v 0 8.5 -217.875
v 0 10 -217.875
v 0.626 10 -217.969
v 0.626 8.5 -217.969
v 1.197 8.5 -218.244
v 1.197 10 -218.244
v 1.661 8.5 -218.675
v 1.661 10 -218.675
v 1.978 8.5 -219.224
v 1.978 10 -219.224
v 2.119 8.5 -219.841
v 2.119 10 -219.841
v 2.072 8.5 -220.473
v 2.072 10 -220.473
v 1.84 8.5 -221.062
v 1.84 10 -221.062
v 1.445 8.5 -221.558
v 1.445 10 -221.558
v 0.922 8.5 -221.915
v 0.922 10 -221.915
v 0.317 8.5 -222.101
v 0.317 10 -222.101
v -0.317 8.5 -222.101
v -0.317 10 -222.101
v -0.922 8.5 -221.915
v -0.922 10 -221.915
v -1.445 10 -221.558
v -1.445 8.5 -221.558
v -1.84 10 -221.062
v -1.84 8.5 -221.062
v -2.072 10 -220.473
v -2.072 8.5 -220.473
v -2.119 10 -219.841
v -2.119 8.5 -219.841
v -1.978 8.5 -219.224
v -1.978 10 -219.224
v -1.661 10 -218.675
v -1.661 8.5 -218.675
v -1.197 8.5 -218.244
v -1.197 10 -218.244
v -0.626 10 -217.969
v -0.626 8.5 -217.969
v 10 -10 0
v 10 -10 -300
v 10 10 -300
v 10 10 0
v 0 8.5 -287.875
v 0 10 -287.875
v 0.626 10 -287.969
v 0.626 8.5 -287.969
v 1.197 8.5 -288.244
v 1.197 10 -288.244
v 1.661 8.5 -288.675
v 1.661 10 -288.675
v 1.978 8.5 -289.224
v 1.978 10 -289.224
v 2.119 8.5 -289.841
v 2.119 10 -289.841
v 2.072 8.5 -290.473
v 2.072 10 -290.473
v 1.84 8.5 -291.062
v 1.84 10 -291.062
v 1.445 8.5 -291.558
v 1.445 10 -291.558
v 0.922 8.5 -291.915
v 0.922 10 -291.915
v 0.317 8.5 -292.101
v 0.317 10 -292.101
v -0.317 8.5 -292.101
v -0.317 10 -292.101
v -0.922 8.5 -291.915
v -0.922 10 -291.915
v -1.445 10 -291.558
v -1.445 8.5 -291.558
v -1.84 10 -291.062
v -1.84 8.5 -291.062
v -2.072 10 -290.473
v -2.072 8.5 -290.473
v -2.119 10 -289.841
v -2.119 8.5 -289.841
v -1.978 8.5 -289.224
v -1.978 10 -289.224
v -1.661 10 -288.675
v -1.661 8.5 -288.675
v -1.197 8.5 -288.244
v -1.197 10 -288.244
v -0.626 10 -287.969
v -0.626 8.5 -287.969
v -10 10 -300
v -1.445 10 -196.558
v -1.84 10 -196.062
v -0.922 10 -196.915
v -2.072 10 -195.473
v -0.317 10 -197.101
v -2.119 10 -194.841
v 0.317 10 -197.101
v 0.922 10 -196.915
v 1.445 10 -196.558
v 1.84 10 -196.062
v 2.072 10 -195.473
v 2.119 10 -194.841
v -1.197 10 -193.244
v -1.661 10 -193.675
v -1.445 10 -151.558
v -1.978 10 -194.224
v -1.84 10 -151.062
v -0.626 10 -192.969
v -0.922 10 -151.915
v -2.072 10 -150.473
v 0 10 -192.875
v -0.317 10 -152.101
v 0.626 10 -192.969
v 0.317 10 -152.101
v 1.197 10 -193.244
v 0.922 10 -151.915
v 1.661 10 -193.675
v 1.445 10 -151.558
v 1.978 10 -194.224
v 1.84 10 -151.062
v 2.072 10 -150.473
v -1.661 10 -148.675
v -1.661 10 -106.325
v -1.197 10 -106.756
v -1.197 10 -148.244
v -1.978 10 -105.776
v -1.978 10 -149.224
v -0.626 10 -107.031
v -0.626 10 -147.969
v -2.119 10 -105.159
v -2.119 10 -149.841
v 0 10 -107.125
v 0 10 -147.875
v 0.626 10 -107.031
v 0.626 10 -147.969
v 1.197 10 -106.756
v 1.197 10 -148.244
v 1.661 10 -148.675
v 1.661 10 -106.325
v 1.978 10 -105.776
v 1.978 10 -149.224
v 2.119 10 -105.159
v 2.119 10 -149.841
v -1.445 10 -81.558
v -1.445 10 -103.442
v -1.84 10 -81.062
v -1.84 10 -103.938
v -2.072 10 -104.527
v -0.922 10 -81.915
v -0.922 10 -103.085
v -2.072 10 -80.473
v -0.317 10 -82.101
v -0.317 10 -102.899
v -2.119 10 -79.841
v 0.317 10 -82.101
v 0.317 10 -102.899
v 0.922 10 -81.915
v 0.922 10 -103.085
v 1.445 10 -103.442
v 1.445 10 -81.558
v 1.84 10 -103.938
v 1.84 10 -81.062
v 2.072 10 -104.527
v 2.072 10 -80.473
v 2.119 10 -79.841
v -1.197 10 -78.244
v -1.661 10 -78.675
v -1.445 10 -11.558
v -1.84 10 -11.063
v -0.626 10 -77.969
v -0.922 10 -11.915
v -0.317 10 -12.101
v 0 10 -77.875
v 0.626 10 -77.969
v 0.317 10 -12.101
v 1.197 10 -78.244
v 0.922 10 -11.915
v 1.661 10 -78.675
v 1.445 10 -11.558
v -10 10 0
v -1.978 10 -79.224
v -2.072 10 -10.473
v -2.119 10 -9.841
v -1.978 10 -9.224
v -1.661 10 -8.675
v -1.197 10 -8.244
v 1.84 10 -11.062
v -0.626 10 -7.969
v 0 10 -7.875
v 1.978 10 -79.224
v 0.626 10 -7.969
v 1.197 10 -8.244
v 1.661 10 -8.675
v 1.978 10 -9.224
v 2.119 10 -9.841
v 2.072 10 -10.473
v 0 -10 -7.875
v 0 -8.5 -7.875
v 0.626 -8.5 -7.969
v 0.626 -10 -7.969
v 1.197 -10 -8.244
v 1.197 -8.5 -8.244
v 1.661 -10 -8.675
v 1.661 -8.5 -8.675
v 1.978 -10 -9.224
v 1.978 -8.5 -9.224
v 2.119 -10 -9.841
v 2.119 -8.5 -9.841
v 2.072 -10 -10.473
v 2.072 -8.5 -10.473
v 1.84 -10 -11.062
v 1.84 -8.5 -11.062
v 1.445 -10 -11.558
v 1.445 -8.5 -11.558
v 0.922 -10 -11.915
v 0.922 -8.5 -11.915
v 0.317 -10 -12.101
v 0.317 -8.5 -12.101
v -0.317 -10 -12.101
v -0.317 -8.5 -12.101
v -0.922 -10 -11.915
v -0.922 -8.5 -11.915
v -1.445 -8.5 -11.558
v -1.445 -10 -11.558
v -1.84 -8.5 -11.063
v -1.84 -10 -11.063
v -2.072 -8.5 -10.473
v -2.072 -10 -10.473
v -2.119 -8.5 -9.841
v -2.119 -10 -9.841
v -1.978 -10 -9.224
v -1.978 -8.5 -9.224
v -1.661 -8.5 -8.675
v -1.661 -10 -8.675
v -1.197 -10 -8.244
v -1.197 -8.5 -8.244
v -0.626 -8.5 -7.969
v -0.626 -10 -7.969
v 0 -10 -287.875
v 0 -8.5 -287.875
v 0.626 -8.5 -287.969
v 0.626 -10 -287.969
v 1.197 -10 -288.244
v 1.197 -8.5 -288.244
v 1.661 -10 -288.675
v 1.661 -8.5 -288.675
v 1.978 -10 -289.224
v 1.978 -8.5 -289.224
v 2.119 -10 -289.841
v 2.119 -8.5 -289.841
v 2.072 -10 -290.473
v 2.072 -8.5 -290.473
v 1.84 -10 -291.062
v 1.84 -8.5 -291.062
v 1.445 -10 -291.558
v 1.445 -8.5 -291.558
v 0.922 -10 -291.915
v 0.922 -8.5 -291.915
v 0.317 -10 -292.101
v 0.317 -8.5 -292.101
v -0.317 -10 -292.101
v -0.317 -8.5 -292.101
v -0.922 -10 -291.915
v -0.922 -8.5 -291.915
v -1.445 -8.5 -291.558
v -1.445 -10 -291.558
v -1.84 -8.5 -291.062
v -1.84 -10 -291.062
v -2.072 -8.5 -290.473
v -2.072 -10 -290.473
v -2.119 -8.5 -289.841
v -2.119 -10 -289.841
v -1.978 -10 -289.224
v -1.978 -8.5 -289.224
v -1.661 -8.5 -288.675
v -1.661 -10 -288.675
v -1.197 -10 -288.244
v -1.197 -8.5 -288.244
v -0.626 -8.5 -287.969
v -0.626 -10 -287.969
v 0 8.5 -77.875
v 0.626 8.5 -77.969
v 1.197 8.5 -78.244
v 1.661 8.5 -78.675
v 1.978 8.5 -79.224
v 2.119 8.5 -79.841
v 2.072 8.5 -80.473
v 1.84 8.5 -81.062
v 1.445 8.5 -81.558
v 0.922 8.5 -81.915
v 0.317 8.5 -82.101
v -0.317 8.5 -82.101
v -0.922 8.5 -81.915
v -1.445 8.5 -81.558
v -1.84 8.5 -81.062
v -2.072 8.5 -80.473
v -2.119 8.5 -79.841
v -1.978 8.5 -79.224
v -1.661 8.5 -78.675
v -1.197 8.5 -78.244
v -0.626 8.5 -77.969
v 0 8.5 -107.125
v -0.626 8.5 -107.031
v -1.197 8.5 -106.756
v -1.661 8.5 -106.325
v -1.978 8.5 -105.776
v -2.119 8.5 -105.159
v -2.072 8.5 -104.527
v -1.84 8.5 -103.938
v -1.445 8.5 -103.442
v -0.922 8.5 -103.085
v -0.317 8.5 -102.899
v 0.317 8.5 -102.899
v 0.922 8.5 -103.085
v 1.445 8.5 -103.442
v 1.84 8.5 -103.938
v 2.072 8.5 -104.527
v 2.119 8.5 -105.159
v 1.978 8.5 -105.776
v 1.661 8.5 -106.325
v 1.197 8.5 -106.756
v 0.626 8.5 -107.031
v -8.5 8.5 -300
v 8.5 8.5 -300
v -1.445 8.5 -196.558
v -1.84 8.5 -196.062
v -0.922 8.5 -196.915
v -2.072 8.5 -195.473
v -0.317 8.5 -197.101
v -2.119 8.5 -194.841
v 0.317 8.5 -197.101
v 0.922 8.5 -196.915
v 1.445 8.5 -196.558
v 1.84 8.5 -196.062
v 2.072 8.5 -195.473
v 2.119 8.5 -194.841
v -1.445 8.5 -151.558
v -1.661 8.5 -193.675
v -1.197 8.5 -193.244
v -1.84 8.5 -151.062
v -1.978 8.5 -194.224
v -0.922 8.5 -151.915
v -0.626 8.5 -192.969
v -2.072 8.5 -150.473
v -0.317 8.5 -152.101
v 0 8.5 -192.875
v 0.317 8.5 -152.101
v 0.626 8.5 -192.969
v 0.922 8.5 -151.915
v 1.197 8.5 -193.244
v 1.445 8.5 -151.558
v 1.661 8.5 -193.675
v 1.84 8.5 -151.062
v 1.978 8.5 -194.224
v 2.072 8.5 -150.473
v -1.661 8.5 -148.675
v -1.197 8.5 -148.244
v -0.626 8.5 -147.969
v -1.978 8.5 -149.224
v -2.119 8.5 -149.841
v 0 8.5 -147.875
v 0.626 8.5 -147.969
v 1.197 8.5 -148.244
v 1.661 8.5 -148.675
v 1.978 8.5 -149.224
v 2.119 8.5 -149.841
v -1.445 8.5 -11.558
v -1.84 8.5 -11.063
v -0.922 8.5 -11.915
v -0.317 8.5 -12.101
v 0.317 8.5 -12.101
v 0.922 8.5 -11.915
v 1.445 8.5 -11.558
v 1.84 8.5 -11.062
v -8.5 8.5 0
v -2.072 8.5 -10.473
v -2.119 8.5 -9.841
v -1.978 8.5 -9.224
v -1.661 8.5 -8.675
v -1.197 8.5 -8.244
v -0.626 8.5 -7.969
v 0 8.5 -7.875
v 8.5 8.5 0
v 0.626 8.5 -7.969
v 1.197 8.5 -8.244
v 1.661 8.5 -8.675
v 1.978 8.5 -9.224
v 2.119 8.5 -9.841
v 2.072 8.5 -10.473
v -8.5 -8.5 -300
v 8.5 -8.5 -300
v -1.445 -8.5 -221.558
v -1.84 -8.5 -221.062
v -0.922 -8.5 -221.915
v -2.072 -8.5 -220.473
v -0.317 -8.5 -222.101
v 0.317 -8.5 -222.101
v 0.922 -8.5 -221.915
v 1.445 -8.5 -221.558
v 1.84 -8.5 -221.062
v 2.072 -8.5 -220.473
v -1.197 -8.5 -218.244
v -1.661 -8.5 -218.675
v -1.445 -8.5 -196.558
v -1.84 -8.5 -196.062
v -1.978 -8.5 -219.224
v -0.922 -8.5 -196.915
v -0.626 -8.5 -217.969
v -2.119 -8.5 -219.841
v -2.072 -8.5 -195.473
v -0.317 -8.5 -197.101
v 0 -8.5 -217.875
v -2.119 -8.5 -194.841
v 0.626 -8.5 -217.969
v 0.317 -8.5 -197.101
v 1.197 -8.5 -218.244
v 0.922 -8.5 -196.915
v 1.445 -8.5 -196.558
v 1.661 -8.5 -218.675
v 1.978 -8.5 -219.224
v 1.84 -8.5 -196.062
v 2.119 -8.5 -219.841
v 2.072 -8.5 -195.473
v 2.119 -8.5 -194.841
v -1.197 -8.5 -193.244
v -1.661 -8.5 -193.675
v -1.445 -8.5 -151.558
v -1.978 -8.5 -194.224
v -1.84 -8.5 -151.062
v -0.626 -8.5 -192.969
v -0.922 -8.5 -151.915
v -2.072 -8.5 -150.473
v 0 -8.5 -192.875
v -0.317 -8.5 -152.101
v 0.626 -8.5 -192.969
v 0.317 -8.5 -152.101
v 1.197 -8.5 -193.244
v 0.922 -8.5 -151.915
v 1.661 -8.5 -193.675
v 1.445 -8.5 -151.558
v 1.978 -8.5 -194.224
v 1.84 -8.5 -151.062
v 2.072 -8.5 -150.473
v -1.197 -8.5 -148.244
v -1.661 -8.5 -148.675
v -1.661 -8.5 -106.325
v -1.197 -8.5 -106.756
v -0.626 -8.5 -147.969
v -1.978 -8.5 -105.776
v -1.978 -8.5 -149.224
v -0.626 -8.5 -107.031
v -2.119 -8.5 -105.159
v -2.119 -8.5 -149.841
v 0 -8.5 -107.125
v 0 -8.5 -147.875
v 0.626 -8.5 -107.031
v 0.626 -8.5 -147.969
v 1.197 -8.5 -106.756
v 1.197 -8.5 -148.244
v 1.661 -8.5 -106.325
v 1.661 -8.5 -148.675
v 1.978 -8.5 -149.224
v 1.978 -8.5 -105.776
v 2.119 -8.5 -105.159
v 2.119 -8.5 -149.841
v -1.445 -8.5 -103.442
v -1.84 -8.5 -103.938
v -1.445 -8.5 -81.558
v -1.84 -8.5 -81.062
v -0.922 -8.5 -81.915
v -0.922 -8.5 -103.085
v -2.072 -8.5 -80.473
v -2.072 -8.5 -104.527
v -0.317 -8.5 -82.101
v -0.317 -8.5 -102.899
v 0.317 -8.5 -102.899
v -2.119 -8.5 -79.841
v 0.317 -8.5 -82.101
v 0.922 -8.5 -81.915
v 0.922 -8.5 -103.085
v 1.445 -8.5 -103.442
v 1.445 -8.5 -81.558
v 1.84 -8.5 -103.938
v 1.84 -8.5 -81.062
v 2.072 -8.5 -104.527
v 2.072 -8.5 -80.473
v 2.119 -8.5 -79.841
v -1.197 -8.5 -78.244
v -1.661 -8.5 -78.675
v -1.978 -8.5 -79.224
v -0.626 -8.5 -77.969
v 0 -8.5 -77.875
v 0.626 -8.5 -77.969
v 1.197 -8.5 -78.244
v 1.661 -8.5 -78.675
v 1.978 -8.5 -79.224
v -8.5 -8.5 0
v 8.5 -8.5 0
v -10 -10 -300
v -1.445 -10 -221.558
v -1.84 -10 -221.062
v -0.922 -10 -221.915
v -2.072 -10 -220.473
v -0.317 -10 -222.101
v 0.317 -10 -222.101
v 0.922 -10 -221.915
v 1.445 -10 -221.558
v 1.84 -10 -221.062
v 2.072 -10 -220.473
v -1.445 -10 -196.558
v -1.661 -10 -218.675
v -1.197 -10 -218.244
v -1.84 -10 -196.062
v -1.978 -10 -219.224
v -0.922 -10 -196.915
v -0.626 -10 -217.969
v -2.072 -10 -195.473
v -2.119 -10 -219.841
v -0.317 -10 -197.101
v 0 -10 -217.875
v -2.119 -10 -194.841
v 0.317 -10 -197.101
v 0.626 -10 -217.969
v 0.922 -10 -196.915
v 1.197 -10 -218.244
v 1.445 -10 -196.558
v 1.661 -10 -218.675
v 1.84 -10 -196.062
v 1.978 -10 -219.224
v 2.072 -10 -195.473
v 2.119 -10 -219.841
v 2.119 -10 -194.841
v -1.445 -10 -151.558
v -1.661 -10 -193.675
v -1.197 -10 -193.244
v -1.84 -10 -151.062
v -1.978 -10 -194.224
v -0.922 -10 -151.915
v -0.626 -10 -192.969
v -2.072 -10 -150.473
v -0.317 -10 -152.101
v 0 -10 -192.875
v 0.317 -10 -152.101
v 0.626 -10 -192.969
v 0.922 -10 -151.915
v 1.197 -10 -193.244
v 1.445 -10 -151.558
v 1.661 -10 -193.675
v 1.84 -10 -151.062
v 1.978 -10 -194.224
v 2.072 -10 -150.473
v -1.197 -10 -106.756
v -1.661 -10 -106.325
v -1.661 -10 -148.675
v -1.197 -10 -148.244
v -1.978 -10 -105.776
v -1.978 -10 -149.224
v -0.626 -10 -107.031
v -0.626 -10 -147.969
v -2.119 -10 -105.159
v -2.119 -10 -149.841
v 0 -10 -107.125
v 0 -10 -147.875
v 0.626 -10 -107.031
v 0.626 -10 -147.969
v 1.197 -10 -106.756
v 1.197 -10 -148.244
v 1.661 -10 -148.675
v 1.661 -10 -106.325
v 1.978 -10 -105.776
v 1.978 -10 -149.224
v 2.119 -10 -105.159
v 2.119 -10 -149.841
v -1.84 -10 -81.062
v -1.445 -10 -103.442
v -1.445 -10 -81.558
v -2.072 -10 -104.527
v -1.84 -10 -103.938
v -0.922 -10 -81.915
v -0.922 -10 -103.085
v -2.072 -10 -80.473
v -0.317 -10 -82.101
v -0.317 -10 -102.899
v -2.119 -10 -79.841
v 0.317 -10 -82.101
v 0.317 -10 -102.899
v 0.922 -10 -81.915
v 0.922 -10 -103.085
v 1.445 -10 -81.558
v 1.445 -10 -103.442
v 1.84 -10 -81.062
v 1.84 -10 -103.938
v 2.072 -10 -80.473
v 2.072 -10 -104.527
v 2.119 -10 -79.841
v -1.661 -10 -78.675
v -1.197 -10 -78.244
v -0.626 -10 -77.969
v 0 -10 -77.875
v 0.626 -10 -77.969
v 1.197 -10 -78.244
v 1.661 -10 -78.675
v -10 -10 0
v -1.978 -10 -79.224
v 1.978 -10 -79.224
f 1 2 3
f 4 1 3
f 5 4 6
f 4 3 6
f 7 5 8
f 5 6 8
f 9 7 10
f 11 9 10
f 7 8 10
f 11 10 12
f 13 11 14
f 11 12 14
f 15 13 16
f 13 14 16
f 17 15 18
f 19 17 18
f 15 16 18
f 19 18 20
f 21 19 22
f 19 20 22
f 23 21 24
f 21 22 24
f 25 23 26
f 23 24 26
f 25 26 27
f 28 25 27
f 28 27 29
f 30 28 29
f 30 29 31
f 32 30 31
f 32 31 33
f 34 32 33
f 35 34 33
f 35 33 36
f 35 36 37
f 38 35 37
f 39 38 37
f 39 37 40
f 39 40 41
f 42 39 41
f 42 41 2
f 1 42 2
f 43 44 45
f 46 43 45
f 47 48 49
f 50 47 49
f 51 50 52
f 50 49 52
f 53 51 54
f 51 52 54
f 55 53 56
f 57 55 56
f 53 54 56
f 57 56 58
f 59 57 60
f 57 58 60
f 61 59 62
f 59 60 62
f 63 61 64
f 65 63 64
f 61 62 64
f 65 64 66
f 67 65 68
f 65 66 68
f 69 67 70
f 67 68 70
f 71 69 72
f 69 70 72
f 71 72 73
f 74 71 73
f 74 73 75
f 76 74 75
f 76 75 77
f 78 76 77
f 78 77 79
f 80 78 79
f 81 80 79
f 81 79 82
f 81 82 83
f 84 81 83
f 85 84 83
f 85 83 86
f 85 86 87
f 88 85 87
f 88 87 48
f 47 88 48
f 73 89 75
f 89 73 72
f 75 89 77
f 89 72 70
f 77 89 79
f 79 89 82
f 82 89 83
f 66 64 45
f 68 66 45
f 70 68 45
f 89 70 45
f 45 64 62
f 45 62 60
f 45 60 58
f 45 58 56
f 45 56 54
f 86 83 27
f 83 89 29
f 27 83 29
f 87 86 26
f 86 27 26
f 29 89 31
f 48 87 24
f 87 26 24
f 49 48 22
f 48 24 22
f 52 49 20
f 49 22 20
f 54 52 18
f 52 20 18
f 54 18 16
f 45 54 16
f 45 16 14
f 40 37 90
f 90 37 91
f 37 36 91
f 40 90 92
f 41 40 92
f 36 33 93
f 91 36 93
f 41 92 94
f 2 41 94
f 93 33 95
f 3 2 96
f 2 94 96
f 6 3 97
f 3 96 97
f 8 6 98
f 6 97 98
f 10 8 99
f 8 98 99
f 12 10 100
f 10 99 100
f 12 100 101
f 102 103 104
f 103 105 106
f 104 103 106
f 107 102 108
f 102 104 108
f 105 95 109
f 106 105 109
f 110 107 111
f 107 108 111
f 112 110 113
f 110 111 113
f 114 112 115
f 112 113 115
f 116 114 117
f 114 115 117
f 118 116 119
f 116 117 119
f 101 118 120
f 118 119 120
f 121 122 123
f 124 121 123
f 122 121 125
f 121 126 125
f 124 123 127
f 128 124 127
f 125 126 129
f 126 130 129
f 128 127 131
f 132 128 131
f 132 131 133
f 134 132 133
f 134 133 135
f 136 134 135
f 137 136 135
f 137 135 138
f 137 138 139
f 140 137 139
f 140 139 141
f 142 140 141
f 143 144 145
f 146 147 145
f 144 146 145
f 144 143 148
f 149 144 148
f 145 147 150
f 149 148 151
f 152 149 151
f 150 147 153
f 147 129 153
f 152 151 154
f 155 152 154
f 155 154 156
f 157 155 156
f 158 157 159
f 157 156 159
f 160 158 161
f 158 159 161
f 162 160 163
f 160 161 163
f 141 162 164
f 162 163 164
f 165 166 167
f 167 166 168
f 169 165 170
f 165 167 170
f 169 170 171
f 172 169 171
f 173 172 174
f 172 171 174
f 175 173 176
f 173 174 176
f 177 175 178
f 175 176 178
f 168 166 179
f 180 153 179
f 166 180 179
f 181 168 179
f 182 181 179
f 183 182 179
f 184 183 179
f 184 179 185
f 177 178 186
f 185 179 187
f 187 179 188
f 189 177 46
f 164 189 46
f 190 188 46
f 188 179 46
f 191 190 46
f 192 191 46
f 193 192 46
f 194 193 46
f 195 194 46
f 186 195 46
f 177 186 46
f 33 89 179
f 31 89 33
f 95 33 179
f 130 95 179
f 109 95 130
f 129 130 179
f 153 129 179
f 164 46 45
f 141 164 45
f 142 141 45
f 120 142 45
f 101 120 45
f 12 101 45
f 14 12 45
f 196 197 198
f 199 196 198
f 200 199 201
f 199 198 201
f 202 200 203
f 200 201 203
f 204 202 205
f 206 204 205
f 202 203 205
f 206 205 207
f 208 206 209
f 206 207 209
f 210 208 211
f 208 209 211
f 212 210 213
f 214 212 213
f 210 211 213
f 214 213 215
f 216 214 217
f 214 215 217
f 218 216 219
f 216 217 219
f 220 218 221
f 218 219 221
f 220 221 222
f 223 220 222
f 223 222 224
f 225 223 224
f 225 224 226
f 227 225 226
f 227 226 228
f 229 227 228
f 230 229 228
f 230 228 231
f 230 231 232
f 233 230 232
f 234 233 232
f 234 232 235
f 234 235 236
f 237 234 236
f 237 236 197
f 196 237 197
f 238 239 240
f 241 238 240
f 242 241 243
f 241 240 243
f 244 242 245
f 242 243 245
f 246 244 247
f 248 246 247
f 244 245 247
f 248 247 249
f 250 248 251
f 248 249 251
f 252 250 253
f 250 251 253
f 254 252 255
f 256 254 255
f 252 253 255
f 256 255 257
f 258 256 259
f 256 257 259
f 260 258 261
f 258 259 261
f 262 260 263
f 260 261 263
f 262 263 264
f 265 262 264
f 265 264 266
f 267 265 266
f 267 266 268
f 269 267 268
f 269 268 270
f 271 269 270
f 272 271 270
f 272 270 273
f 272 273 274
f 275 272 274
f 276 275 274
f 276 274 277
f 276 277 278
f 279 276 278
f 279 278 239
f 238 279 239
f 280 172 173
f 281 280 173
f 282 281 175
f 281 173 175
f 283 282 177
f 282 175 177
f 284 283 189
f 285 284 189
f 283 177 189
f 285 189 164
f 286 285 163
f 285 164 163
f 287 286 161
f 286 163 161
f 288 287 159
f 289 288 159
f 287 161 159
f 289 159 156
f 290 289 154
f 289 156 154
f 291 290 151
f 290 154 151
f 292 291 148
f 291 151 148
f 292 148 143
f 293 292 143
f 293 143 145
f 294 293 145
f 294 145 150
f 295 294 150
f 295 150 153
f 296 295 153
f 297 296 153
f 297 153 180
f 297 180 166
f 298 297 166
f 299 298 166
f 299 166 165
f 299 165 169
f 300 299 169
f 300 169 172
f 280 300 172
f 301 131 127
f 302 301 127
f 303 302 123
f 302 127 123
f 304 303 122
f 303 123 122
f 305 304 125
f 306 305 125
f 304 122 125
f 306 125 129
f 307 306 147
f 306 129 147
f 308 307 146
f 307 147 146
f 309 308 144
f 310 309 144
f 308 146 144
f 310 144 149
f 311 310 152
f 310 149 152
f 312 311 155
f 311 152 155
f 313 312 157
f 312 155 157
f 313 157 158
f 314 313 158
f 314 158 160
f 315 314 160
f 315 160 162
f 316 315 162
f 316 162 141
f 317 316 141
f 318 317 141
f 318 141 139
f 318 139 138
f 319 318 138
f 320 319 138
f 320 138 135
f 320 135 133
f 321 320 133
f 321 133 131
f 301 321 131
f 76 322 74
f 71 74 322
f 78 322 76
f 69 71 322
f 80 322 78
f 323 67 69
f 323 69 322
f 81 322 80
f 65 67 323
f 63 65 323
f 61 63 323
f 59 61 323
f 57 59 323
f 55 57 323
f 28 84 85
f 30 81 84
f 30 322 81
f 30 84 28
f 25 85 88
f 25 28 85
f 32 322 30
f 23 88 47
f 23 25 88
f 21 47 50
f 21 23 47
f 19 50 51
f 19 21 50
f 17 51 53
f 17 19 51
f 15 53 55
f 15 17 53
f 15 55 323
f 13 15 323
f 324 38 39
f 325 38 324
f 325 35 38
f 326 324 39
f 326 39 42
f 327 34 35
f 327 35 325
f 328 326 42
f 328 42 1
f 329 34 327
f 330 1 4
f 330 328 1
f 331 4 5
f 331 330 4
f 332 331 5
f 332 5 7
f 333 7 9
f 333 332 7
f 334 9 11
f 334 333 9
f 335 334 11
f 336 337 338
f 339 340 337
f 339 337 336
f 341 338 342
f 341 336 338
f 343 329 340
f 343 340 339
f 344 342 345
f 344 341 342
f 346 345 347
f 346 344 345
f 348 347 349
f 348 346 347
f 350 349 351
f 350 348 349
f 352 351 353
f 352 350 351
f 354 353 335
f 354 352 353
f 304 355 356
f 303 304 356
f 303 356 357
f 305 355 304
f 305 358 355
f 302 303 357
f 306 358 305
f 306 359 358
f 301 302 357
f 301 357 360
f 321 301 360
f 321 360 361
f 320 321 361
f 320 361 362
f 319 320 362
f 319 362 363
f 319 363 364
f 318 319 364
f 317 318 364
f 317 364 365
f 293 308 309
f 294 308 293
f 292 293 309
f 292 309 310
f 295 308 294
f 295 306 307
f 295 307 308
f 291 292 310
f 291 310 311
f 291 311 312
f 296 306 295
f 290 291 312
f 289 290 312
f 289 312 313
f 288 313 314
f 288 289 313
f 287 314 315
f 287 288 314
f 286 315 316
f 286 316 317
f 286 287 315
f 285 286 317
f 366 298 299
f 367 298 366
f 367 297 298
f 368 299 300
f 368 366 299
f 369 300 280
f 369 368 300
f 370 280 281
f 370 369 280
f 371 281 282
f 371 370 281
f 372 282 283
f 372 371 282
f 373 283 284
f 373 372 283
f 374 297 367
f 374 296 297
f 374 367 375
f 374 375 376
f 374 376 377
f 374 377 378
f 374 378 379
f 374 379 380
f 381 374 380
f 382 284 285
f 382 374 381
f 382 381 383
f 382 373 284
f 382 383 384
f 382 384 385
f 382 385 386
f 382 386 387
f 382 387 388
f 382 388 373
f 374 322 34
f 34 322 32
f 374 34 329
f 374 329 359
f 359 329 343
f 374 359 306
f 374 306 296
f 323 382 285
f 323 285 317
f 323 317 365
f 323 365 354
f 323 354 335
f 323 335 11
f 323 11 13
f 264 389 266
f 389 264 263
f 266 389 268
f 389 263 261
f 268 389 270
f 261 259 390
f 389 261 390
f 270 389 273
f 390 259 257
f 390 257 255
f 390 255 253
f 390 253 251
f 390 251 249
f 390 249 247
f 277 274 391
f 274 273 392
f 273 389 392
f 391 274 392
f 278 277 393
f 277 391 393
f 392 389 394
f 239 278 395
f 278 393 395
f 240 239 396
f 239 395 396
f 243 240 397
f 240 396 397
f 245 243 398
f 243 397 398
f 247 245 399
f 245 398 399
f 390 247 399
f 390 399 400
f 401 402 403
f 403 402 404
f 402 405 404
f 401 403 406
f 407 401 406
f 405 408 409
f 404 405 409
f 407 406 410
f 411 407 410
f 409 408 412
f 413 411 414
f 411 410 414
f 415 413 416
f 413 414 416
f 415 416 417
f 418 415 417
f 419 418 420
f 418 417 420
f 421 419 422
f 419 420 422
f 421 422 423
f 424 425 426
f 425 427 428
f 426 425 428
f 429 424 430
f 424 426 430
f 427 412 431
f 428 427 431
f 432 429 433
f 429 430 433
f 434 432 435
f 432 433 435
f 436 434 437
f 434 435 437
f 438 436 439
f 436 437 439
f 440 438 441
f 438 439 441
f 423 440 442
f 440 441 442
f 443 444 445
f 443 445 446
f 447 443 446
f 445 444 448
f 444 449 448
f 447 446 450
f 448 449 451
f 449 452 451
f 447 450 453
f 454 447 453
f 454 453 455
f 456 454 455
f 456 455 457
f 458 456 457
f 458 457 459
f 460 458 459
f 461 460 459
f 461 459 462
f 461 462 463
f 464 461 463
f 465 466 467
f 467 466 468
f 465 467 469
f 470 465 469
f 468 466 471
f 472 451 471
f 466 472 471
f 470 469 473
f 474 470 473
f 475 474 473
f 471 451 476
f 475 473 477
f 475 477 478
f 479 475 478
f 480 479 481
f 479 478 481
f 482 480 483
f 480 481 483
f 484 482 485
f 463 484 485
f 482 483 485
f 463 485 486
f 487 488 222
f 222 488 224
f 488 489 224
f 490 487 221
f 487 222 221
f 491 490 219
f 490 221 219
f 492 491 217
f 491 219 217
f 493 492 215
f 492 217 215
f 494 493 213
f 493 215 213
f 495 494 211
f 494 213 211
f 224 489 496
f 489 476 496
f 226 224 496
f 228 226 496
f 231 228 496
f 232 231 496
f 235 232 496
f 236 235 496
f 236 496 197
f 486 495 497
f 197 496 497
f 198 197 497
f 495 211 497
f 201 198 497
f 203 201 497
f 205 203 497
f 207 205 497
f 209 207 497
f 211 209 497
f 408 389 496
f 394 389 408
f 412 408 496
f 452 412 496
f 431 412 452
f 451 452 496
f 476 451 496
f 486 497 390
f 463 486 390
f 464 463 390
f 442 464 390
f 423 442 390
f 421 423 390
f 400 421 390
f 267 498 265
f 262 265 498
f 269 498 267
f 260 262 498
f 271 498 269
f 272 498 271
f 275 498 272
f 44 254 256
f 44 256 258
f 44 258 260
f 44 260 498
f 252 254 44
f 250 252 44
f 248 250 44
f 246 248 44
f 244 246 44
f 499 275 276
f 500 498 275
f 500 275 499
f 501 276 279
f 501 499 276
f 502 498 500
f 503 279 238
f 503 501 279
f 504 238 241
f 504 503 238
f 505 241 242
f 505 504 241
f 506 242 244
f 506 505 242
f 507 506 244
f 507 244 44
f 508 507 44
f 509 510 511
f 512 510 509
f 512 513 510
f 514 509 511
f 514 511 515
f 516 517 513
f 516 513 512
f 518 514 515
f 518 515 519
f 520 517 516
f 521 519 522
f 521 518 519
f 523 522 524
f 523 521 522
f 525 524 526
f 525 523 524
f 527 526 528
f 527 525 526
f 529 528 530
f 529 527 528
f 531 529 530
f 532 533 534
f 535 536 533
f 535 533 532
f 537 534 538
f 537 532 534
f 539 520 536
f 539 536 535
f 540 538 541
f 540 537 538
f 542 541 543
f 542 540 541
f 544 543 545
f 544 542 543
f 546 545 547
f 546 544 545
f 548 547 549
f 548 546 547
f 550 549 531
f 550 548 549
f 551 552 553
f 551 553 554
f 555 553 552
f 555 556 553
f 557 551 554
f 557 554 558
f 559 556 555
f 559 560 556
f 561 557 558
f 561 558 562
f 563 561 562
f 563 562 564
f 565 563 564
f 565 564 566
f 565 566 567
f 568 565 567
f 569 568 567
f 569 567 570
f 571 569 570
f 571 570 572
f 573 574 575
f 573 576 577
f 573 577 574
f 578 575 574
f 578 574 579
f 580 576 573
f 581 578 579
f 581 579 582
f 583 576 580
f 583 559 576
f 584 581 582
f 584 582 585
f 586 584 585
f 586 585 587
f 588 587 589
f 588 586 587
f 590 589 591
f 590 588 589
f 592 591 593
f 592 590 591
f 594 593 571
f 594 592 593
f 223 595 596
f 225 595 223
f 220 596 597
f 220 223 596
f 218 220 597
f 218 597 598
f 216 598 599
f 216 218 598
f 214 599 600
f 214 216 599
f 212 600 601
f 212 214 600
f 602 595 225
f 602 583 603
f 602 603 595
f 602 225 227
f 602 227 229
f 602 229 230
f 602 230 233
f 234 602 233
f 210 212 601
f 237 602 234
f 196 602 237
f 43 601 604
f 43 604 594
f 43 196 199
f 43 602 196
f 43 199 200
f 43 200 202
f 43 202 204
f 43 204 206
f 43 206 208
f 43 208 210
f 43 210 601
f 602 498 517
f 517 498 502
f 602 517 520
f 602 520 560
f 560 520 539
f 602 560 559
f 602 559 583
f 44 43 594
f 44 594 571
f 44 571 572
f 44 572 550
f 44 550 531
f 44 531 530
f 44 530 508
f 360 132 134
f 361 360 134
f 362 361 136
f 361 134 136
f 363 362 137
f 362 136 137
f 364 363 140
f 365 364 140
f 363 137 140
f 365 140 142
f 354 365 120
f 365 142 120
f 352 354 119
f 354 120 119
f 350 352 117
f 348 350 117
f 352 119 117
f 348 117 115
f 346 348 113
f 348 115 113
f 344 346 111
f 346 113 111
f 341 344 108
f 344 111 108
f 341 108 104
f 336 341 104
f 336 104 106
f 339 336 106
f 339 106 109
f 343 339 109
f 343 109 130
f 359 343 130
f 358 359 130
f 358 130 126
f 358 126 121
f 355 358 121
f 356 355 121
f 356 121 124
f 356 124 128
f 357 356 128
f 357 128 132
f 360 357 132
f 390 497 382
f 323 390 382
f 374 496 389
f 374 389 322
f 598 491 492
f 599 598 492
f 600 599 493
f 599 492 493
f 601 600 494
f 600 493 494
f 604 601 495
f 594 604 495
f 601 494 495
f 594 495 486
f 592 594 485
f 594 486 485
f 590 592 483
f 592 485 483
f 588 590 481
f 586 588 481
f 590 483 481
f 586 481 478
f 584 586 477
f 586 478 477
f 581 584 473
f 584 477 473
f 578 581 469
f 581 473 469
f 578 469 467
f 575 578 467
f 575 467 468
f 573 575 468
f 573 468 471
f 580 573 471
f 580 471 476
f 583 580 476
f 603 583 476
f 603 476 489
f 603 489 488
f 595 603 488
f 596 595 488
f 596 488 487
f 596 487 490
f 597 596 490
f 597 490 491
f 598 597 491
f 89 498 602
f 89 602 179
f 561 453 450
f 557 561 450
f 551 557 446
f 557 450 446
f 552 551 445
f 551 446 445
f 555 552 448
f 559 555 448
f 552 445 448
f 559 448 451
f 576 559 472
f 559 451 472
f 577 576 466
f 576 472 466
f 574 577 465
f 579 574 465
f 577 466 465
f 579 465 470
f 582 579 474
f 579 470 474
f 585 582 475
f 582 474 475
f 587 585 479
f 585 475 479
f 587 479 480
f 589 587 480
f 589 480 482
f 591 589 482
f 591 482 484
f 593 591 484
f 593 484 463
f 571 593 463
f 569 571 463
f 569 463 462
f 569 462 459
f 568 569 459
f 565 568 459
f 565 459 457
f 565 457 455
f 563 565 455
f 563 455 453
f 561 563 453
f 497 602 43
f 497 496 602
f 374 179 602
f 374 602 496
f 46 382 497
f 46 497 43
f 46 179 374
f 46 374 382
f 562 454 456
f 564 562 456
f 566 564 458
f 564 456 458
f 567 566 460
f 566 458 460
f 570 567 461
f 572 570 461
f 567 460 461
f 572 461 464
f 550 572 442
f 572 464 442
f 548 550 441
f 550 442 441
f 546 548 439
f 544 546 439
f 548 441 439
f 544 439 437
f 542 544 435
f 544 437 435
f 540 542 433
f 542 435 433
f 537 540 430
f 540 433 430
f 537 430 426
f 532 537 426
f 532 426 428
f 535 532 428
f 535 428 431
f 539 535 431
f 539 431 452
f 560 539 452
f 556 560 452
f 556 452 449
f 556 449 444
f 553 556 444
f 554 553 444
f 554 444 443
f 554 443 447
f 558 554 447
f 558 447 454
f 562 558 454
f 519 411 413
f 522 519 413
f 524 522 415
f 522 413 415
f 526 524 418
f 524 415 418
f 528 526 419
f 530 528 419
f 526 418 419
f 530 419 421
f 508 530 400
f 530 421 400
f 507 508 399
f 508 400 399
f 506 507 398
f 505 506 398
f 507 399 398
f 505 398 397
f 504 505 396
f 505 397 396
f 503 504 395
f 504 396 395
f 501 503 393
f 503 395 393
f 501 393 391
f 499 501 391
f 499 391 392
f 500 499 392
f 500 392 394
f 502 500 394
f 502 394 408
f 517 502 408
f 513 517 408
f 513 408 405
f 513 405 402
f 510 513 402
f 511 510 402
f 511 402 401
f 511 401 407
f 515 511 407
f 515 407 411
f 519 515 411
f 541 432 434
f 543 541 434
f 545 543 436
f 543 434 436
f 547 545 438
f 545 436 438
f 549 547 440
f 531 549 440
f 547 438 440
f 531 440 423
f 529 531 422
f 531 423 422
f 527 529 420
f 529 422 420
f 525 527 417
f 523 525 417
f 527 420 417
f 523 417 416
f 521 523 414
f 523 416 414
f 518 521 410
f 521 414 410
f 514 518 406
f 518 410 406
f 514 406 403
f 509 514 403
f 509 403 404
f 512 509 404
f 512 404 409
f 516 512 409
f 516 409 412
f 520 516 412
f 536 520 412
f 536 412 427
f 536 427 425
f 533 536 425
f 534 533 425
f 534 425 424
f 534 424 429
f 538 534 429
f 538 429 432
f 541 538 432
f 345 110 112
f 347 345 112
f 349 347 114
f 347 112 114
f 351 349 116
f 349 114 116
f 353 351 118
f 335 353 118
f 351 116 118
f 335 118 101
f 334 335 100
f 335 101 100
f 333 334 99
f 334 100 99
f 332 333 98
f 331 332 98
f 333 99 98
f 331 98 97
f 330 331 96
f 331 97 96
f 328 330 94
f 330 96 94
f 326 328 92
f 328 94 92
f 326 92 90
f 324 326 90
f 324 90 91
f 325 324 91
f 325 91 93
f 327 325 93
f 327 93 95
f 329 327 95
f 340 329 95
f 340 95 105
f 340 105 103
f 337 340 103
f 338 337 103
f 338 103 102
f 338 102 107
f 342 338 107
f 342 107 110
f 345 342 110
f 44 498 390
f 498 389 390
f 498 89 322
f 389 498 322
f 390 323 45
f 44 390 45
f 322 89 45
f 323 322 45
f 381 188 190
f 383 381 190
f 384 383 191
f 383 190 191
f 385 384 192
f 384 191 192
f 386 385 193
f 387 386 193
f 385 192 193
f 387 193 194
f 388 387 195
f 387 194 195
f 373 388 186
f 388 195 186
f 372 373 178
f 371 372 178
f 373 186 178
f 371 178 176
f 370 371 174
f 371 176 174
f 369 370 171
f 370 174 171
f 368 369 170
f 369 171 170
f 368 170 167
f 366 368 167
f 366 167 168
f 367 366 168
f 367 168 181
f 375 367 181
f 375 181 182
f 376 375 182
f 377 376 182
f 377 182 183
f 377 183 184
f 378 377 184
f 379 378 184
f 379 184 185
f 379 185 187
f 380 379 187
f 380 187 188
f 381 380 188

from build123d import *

# Parameters (mm, degrees)
SKETCH1_W           = 20
SKETCH1_H           = 20
SKETCH1_W_2         = 17
SKETCH1_H_2         = 17
BOSS_EXTRUDE1_DEPTH = 300
SKETCH2_R           = 2.125
CUT_EXTRUDE1_DEPTH  = 301.83217913


with BuildPart() as part:
    # Sketch1 → Boss-Extrude1 (new body)
    with BuildSketch(Plane.XY):
        Rectangle(SKETCH1_W, SKETCH1_H)
        Rectangle(SKETCH1_W_2, SKETCH1_H_2, mode=Mode.SUBTRACT)
    extrude(amount=-BOSS_EXTRUDE1_DEPTH)

    # Sketch2 → Cut-Extrude1 (cut, through all)
    with BuildSketch(Plane(origin=(0, 10, 0), x_dir=(1, 0, 0), z_dir=(0, 1, 0))):
        with Locations(Location((0, 10, 0), (0, 0, 270))):
            Circle(SKETCH2_R)
        with Locations(Location((0, 80, 0), (0, 0, 270))):
            Circle(SKETCH2_R)
        with Locations(Location((0, 150, 0), (0, 0, 270))):
            Circle(SKETCH2_R)
        with Locations(Location((0, 220, 0), (0, 0, 270))):
            Circle(SKETCH2_R)
        with Locations(Location((0, 290, 0), (0, 0, 270))):
            Circle(SKETCH2_R)
        with Locations(Location((0, 195, 0), (0, 0, 270))):
            Circle(SKETCH2_R)
        with Locations(Location((0, 105, 0), (0, 0, 90))):
            Circle(SKETCH2_R)
    extrude(amount=-CUT_EXTRUDE1_DEPTH, mode=Mode.SUBTRACT)


solid = part.part
